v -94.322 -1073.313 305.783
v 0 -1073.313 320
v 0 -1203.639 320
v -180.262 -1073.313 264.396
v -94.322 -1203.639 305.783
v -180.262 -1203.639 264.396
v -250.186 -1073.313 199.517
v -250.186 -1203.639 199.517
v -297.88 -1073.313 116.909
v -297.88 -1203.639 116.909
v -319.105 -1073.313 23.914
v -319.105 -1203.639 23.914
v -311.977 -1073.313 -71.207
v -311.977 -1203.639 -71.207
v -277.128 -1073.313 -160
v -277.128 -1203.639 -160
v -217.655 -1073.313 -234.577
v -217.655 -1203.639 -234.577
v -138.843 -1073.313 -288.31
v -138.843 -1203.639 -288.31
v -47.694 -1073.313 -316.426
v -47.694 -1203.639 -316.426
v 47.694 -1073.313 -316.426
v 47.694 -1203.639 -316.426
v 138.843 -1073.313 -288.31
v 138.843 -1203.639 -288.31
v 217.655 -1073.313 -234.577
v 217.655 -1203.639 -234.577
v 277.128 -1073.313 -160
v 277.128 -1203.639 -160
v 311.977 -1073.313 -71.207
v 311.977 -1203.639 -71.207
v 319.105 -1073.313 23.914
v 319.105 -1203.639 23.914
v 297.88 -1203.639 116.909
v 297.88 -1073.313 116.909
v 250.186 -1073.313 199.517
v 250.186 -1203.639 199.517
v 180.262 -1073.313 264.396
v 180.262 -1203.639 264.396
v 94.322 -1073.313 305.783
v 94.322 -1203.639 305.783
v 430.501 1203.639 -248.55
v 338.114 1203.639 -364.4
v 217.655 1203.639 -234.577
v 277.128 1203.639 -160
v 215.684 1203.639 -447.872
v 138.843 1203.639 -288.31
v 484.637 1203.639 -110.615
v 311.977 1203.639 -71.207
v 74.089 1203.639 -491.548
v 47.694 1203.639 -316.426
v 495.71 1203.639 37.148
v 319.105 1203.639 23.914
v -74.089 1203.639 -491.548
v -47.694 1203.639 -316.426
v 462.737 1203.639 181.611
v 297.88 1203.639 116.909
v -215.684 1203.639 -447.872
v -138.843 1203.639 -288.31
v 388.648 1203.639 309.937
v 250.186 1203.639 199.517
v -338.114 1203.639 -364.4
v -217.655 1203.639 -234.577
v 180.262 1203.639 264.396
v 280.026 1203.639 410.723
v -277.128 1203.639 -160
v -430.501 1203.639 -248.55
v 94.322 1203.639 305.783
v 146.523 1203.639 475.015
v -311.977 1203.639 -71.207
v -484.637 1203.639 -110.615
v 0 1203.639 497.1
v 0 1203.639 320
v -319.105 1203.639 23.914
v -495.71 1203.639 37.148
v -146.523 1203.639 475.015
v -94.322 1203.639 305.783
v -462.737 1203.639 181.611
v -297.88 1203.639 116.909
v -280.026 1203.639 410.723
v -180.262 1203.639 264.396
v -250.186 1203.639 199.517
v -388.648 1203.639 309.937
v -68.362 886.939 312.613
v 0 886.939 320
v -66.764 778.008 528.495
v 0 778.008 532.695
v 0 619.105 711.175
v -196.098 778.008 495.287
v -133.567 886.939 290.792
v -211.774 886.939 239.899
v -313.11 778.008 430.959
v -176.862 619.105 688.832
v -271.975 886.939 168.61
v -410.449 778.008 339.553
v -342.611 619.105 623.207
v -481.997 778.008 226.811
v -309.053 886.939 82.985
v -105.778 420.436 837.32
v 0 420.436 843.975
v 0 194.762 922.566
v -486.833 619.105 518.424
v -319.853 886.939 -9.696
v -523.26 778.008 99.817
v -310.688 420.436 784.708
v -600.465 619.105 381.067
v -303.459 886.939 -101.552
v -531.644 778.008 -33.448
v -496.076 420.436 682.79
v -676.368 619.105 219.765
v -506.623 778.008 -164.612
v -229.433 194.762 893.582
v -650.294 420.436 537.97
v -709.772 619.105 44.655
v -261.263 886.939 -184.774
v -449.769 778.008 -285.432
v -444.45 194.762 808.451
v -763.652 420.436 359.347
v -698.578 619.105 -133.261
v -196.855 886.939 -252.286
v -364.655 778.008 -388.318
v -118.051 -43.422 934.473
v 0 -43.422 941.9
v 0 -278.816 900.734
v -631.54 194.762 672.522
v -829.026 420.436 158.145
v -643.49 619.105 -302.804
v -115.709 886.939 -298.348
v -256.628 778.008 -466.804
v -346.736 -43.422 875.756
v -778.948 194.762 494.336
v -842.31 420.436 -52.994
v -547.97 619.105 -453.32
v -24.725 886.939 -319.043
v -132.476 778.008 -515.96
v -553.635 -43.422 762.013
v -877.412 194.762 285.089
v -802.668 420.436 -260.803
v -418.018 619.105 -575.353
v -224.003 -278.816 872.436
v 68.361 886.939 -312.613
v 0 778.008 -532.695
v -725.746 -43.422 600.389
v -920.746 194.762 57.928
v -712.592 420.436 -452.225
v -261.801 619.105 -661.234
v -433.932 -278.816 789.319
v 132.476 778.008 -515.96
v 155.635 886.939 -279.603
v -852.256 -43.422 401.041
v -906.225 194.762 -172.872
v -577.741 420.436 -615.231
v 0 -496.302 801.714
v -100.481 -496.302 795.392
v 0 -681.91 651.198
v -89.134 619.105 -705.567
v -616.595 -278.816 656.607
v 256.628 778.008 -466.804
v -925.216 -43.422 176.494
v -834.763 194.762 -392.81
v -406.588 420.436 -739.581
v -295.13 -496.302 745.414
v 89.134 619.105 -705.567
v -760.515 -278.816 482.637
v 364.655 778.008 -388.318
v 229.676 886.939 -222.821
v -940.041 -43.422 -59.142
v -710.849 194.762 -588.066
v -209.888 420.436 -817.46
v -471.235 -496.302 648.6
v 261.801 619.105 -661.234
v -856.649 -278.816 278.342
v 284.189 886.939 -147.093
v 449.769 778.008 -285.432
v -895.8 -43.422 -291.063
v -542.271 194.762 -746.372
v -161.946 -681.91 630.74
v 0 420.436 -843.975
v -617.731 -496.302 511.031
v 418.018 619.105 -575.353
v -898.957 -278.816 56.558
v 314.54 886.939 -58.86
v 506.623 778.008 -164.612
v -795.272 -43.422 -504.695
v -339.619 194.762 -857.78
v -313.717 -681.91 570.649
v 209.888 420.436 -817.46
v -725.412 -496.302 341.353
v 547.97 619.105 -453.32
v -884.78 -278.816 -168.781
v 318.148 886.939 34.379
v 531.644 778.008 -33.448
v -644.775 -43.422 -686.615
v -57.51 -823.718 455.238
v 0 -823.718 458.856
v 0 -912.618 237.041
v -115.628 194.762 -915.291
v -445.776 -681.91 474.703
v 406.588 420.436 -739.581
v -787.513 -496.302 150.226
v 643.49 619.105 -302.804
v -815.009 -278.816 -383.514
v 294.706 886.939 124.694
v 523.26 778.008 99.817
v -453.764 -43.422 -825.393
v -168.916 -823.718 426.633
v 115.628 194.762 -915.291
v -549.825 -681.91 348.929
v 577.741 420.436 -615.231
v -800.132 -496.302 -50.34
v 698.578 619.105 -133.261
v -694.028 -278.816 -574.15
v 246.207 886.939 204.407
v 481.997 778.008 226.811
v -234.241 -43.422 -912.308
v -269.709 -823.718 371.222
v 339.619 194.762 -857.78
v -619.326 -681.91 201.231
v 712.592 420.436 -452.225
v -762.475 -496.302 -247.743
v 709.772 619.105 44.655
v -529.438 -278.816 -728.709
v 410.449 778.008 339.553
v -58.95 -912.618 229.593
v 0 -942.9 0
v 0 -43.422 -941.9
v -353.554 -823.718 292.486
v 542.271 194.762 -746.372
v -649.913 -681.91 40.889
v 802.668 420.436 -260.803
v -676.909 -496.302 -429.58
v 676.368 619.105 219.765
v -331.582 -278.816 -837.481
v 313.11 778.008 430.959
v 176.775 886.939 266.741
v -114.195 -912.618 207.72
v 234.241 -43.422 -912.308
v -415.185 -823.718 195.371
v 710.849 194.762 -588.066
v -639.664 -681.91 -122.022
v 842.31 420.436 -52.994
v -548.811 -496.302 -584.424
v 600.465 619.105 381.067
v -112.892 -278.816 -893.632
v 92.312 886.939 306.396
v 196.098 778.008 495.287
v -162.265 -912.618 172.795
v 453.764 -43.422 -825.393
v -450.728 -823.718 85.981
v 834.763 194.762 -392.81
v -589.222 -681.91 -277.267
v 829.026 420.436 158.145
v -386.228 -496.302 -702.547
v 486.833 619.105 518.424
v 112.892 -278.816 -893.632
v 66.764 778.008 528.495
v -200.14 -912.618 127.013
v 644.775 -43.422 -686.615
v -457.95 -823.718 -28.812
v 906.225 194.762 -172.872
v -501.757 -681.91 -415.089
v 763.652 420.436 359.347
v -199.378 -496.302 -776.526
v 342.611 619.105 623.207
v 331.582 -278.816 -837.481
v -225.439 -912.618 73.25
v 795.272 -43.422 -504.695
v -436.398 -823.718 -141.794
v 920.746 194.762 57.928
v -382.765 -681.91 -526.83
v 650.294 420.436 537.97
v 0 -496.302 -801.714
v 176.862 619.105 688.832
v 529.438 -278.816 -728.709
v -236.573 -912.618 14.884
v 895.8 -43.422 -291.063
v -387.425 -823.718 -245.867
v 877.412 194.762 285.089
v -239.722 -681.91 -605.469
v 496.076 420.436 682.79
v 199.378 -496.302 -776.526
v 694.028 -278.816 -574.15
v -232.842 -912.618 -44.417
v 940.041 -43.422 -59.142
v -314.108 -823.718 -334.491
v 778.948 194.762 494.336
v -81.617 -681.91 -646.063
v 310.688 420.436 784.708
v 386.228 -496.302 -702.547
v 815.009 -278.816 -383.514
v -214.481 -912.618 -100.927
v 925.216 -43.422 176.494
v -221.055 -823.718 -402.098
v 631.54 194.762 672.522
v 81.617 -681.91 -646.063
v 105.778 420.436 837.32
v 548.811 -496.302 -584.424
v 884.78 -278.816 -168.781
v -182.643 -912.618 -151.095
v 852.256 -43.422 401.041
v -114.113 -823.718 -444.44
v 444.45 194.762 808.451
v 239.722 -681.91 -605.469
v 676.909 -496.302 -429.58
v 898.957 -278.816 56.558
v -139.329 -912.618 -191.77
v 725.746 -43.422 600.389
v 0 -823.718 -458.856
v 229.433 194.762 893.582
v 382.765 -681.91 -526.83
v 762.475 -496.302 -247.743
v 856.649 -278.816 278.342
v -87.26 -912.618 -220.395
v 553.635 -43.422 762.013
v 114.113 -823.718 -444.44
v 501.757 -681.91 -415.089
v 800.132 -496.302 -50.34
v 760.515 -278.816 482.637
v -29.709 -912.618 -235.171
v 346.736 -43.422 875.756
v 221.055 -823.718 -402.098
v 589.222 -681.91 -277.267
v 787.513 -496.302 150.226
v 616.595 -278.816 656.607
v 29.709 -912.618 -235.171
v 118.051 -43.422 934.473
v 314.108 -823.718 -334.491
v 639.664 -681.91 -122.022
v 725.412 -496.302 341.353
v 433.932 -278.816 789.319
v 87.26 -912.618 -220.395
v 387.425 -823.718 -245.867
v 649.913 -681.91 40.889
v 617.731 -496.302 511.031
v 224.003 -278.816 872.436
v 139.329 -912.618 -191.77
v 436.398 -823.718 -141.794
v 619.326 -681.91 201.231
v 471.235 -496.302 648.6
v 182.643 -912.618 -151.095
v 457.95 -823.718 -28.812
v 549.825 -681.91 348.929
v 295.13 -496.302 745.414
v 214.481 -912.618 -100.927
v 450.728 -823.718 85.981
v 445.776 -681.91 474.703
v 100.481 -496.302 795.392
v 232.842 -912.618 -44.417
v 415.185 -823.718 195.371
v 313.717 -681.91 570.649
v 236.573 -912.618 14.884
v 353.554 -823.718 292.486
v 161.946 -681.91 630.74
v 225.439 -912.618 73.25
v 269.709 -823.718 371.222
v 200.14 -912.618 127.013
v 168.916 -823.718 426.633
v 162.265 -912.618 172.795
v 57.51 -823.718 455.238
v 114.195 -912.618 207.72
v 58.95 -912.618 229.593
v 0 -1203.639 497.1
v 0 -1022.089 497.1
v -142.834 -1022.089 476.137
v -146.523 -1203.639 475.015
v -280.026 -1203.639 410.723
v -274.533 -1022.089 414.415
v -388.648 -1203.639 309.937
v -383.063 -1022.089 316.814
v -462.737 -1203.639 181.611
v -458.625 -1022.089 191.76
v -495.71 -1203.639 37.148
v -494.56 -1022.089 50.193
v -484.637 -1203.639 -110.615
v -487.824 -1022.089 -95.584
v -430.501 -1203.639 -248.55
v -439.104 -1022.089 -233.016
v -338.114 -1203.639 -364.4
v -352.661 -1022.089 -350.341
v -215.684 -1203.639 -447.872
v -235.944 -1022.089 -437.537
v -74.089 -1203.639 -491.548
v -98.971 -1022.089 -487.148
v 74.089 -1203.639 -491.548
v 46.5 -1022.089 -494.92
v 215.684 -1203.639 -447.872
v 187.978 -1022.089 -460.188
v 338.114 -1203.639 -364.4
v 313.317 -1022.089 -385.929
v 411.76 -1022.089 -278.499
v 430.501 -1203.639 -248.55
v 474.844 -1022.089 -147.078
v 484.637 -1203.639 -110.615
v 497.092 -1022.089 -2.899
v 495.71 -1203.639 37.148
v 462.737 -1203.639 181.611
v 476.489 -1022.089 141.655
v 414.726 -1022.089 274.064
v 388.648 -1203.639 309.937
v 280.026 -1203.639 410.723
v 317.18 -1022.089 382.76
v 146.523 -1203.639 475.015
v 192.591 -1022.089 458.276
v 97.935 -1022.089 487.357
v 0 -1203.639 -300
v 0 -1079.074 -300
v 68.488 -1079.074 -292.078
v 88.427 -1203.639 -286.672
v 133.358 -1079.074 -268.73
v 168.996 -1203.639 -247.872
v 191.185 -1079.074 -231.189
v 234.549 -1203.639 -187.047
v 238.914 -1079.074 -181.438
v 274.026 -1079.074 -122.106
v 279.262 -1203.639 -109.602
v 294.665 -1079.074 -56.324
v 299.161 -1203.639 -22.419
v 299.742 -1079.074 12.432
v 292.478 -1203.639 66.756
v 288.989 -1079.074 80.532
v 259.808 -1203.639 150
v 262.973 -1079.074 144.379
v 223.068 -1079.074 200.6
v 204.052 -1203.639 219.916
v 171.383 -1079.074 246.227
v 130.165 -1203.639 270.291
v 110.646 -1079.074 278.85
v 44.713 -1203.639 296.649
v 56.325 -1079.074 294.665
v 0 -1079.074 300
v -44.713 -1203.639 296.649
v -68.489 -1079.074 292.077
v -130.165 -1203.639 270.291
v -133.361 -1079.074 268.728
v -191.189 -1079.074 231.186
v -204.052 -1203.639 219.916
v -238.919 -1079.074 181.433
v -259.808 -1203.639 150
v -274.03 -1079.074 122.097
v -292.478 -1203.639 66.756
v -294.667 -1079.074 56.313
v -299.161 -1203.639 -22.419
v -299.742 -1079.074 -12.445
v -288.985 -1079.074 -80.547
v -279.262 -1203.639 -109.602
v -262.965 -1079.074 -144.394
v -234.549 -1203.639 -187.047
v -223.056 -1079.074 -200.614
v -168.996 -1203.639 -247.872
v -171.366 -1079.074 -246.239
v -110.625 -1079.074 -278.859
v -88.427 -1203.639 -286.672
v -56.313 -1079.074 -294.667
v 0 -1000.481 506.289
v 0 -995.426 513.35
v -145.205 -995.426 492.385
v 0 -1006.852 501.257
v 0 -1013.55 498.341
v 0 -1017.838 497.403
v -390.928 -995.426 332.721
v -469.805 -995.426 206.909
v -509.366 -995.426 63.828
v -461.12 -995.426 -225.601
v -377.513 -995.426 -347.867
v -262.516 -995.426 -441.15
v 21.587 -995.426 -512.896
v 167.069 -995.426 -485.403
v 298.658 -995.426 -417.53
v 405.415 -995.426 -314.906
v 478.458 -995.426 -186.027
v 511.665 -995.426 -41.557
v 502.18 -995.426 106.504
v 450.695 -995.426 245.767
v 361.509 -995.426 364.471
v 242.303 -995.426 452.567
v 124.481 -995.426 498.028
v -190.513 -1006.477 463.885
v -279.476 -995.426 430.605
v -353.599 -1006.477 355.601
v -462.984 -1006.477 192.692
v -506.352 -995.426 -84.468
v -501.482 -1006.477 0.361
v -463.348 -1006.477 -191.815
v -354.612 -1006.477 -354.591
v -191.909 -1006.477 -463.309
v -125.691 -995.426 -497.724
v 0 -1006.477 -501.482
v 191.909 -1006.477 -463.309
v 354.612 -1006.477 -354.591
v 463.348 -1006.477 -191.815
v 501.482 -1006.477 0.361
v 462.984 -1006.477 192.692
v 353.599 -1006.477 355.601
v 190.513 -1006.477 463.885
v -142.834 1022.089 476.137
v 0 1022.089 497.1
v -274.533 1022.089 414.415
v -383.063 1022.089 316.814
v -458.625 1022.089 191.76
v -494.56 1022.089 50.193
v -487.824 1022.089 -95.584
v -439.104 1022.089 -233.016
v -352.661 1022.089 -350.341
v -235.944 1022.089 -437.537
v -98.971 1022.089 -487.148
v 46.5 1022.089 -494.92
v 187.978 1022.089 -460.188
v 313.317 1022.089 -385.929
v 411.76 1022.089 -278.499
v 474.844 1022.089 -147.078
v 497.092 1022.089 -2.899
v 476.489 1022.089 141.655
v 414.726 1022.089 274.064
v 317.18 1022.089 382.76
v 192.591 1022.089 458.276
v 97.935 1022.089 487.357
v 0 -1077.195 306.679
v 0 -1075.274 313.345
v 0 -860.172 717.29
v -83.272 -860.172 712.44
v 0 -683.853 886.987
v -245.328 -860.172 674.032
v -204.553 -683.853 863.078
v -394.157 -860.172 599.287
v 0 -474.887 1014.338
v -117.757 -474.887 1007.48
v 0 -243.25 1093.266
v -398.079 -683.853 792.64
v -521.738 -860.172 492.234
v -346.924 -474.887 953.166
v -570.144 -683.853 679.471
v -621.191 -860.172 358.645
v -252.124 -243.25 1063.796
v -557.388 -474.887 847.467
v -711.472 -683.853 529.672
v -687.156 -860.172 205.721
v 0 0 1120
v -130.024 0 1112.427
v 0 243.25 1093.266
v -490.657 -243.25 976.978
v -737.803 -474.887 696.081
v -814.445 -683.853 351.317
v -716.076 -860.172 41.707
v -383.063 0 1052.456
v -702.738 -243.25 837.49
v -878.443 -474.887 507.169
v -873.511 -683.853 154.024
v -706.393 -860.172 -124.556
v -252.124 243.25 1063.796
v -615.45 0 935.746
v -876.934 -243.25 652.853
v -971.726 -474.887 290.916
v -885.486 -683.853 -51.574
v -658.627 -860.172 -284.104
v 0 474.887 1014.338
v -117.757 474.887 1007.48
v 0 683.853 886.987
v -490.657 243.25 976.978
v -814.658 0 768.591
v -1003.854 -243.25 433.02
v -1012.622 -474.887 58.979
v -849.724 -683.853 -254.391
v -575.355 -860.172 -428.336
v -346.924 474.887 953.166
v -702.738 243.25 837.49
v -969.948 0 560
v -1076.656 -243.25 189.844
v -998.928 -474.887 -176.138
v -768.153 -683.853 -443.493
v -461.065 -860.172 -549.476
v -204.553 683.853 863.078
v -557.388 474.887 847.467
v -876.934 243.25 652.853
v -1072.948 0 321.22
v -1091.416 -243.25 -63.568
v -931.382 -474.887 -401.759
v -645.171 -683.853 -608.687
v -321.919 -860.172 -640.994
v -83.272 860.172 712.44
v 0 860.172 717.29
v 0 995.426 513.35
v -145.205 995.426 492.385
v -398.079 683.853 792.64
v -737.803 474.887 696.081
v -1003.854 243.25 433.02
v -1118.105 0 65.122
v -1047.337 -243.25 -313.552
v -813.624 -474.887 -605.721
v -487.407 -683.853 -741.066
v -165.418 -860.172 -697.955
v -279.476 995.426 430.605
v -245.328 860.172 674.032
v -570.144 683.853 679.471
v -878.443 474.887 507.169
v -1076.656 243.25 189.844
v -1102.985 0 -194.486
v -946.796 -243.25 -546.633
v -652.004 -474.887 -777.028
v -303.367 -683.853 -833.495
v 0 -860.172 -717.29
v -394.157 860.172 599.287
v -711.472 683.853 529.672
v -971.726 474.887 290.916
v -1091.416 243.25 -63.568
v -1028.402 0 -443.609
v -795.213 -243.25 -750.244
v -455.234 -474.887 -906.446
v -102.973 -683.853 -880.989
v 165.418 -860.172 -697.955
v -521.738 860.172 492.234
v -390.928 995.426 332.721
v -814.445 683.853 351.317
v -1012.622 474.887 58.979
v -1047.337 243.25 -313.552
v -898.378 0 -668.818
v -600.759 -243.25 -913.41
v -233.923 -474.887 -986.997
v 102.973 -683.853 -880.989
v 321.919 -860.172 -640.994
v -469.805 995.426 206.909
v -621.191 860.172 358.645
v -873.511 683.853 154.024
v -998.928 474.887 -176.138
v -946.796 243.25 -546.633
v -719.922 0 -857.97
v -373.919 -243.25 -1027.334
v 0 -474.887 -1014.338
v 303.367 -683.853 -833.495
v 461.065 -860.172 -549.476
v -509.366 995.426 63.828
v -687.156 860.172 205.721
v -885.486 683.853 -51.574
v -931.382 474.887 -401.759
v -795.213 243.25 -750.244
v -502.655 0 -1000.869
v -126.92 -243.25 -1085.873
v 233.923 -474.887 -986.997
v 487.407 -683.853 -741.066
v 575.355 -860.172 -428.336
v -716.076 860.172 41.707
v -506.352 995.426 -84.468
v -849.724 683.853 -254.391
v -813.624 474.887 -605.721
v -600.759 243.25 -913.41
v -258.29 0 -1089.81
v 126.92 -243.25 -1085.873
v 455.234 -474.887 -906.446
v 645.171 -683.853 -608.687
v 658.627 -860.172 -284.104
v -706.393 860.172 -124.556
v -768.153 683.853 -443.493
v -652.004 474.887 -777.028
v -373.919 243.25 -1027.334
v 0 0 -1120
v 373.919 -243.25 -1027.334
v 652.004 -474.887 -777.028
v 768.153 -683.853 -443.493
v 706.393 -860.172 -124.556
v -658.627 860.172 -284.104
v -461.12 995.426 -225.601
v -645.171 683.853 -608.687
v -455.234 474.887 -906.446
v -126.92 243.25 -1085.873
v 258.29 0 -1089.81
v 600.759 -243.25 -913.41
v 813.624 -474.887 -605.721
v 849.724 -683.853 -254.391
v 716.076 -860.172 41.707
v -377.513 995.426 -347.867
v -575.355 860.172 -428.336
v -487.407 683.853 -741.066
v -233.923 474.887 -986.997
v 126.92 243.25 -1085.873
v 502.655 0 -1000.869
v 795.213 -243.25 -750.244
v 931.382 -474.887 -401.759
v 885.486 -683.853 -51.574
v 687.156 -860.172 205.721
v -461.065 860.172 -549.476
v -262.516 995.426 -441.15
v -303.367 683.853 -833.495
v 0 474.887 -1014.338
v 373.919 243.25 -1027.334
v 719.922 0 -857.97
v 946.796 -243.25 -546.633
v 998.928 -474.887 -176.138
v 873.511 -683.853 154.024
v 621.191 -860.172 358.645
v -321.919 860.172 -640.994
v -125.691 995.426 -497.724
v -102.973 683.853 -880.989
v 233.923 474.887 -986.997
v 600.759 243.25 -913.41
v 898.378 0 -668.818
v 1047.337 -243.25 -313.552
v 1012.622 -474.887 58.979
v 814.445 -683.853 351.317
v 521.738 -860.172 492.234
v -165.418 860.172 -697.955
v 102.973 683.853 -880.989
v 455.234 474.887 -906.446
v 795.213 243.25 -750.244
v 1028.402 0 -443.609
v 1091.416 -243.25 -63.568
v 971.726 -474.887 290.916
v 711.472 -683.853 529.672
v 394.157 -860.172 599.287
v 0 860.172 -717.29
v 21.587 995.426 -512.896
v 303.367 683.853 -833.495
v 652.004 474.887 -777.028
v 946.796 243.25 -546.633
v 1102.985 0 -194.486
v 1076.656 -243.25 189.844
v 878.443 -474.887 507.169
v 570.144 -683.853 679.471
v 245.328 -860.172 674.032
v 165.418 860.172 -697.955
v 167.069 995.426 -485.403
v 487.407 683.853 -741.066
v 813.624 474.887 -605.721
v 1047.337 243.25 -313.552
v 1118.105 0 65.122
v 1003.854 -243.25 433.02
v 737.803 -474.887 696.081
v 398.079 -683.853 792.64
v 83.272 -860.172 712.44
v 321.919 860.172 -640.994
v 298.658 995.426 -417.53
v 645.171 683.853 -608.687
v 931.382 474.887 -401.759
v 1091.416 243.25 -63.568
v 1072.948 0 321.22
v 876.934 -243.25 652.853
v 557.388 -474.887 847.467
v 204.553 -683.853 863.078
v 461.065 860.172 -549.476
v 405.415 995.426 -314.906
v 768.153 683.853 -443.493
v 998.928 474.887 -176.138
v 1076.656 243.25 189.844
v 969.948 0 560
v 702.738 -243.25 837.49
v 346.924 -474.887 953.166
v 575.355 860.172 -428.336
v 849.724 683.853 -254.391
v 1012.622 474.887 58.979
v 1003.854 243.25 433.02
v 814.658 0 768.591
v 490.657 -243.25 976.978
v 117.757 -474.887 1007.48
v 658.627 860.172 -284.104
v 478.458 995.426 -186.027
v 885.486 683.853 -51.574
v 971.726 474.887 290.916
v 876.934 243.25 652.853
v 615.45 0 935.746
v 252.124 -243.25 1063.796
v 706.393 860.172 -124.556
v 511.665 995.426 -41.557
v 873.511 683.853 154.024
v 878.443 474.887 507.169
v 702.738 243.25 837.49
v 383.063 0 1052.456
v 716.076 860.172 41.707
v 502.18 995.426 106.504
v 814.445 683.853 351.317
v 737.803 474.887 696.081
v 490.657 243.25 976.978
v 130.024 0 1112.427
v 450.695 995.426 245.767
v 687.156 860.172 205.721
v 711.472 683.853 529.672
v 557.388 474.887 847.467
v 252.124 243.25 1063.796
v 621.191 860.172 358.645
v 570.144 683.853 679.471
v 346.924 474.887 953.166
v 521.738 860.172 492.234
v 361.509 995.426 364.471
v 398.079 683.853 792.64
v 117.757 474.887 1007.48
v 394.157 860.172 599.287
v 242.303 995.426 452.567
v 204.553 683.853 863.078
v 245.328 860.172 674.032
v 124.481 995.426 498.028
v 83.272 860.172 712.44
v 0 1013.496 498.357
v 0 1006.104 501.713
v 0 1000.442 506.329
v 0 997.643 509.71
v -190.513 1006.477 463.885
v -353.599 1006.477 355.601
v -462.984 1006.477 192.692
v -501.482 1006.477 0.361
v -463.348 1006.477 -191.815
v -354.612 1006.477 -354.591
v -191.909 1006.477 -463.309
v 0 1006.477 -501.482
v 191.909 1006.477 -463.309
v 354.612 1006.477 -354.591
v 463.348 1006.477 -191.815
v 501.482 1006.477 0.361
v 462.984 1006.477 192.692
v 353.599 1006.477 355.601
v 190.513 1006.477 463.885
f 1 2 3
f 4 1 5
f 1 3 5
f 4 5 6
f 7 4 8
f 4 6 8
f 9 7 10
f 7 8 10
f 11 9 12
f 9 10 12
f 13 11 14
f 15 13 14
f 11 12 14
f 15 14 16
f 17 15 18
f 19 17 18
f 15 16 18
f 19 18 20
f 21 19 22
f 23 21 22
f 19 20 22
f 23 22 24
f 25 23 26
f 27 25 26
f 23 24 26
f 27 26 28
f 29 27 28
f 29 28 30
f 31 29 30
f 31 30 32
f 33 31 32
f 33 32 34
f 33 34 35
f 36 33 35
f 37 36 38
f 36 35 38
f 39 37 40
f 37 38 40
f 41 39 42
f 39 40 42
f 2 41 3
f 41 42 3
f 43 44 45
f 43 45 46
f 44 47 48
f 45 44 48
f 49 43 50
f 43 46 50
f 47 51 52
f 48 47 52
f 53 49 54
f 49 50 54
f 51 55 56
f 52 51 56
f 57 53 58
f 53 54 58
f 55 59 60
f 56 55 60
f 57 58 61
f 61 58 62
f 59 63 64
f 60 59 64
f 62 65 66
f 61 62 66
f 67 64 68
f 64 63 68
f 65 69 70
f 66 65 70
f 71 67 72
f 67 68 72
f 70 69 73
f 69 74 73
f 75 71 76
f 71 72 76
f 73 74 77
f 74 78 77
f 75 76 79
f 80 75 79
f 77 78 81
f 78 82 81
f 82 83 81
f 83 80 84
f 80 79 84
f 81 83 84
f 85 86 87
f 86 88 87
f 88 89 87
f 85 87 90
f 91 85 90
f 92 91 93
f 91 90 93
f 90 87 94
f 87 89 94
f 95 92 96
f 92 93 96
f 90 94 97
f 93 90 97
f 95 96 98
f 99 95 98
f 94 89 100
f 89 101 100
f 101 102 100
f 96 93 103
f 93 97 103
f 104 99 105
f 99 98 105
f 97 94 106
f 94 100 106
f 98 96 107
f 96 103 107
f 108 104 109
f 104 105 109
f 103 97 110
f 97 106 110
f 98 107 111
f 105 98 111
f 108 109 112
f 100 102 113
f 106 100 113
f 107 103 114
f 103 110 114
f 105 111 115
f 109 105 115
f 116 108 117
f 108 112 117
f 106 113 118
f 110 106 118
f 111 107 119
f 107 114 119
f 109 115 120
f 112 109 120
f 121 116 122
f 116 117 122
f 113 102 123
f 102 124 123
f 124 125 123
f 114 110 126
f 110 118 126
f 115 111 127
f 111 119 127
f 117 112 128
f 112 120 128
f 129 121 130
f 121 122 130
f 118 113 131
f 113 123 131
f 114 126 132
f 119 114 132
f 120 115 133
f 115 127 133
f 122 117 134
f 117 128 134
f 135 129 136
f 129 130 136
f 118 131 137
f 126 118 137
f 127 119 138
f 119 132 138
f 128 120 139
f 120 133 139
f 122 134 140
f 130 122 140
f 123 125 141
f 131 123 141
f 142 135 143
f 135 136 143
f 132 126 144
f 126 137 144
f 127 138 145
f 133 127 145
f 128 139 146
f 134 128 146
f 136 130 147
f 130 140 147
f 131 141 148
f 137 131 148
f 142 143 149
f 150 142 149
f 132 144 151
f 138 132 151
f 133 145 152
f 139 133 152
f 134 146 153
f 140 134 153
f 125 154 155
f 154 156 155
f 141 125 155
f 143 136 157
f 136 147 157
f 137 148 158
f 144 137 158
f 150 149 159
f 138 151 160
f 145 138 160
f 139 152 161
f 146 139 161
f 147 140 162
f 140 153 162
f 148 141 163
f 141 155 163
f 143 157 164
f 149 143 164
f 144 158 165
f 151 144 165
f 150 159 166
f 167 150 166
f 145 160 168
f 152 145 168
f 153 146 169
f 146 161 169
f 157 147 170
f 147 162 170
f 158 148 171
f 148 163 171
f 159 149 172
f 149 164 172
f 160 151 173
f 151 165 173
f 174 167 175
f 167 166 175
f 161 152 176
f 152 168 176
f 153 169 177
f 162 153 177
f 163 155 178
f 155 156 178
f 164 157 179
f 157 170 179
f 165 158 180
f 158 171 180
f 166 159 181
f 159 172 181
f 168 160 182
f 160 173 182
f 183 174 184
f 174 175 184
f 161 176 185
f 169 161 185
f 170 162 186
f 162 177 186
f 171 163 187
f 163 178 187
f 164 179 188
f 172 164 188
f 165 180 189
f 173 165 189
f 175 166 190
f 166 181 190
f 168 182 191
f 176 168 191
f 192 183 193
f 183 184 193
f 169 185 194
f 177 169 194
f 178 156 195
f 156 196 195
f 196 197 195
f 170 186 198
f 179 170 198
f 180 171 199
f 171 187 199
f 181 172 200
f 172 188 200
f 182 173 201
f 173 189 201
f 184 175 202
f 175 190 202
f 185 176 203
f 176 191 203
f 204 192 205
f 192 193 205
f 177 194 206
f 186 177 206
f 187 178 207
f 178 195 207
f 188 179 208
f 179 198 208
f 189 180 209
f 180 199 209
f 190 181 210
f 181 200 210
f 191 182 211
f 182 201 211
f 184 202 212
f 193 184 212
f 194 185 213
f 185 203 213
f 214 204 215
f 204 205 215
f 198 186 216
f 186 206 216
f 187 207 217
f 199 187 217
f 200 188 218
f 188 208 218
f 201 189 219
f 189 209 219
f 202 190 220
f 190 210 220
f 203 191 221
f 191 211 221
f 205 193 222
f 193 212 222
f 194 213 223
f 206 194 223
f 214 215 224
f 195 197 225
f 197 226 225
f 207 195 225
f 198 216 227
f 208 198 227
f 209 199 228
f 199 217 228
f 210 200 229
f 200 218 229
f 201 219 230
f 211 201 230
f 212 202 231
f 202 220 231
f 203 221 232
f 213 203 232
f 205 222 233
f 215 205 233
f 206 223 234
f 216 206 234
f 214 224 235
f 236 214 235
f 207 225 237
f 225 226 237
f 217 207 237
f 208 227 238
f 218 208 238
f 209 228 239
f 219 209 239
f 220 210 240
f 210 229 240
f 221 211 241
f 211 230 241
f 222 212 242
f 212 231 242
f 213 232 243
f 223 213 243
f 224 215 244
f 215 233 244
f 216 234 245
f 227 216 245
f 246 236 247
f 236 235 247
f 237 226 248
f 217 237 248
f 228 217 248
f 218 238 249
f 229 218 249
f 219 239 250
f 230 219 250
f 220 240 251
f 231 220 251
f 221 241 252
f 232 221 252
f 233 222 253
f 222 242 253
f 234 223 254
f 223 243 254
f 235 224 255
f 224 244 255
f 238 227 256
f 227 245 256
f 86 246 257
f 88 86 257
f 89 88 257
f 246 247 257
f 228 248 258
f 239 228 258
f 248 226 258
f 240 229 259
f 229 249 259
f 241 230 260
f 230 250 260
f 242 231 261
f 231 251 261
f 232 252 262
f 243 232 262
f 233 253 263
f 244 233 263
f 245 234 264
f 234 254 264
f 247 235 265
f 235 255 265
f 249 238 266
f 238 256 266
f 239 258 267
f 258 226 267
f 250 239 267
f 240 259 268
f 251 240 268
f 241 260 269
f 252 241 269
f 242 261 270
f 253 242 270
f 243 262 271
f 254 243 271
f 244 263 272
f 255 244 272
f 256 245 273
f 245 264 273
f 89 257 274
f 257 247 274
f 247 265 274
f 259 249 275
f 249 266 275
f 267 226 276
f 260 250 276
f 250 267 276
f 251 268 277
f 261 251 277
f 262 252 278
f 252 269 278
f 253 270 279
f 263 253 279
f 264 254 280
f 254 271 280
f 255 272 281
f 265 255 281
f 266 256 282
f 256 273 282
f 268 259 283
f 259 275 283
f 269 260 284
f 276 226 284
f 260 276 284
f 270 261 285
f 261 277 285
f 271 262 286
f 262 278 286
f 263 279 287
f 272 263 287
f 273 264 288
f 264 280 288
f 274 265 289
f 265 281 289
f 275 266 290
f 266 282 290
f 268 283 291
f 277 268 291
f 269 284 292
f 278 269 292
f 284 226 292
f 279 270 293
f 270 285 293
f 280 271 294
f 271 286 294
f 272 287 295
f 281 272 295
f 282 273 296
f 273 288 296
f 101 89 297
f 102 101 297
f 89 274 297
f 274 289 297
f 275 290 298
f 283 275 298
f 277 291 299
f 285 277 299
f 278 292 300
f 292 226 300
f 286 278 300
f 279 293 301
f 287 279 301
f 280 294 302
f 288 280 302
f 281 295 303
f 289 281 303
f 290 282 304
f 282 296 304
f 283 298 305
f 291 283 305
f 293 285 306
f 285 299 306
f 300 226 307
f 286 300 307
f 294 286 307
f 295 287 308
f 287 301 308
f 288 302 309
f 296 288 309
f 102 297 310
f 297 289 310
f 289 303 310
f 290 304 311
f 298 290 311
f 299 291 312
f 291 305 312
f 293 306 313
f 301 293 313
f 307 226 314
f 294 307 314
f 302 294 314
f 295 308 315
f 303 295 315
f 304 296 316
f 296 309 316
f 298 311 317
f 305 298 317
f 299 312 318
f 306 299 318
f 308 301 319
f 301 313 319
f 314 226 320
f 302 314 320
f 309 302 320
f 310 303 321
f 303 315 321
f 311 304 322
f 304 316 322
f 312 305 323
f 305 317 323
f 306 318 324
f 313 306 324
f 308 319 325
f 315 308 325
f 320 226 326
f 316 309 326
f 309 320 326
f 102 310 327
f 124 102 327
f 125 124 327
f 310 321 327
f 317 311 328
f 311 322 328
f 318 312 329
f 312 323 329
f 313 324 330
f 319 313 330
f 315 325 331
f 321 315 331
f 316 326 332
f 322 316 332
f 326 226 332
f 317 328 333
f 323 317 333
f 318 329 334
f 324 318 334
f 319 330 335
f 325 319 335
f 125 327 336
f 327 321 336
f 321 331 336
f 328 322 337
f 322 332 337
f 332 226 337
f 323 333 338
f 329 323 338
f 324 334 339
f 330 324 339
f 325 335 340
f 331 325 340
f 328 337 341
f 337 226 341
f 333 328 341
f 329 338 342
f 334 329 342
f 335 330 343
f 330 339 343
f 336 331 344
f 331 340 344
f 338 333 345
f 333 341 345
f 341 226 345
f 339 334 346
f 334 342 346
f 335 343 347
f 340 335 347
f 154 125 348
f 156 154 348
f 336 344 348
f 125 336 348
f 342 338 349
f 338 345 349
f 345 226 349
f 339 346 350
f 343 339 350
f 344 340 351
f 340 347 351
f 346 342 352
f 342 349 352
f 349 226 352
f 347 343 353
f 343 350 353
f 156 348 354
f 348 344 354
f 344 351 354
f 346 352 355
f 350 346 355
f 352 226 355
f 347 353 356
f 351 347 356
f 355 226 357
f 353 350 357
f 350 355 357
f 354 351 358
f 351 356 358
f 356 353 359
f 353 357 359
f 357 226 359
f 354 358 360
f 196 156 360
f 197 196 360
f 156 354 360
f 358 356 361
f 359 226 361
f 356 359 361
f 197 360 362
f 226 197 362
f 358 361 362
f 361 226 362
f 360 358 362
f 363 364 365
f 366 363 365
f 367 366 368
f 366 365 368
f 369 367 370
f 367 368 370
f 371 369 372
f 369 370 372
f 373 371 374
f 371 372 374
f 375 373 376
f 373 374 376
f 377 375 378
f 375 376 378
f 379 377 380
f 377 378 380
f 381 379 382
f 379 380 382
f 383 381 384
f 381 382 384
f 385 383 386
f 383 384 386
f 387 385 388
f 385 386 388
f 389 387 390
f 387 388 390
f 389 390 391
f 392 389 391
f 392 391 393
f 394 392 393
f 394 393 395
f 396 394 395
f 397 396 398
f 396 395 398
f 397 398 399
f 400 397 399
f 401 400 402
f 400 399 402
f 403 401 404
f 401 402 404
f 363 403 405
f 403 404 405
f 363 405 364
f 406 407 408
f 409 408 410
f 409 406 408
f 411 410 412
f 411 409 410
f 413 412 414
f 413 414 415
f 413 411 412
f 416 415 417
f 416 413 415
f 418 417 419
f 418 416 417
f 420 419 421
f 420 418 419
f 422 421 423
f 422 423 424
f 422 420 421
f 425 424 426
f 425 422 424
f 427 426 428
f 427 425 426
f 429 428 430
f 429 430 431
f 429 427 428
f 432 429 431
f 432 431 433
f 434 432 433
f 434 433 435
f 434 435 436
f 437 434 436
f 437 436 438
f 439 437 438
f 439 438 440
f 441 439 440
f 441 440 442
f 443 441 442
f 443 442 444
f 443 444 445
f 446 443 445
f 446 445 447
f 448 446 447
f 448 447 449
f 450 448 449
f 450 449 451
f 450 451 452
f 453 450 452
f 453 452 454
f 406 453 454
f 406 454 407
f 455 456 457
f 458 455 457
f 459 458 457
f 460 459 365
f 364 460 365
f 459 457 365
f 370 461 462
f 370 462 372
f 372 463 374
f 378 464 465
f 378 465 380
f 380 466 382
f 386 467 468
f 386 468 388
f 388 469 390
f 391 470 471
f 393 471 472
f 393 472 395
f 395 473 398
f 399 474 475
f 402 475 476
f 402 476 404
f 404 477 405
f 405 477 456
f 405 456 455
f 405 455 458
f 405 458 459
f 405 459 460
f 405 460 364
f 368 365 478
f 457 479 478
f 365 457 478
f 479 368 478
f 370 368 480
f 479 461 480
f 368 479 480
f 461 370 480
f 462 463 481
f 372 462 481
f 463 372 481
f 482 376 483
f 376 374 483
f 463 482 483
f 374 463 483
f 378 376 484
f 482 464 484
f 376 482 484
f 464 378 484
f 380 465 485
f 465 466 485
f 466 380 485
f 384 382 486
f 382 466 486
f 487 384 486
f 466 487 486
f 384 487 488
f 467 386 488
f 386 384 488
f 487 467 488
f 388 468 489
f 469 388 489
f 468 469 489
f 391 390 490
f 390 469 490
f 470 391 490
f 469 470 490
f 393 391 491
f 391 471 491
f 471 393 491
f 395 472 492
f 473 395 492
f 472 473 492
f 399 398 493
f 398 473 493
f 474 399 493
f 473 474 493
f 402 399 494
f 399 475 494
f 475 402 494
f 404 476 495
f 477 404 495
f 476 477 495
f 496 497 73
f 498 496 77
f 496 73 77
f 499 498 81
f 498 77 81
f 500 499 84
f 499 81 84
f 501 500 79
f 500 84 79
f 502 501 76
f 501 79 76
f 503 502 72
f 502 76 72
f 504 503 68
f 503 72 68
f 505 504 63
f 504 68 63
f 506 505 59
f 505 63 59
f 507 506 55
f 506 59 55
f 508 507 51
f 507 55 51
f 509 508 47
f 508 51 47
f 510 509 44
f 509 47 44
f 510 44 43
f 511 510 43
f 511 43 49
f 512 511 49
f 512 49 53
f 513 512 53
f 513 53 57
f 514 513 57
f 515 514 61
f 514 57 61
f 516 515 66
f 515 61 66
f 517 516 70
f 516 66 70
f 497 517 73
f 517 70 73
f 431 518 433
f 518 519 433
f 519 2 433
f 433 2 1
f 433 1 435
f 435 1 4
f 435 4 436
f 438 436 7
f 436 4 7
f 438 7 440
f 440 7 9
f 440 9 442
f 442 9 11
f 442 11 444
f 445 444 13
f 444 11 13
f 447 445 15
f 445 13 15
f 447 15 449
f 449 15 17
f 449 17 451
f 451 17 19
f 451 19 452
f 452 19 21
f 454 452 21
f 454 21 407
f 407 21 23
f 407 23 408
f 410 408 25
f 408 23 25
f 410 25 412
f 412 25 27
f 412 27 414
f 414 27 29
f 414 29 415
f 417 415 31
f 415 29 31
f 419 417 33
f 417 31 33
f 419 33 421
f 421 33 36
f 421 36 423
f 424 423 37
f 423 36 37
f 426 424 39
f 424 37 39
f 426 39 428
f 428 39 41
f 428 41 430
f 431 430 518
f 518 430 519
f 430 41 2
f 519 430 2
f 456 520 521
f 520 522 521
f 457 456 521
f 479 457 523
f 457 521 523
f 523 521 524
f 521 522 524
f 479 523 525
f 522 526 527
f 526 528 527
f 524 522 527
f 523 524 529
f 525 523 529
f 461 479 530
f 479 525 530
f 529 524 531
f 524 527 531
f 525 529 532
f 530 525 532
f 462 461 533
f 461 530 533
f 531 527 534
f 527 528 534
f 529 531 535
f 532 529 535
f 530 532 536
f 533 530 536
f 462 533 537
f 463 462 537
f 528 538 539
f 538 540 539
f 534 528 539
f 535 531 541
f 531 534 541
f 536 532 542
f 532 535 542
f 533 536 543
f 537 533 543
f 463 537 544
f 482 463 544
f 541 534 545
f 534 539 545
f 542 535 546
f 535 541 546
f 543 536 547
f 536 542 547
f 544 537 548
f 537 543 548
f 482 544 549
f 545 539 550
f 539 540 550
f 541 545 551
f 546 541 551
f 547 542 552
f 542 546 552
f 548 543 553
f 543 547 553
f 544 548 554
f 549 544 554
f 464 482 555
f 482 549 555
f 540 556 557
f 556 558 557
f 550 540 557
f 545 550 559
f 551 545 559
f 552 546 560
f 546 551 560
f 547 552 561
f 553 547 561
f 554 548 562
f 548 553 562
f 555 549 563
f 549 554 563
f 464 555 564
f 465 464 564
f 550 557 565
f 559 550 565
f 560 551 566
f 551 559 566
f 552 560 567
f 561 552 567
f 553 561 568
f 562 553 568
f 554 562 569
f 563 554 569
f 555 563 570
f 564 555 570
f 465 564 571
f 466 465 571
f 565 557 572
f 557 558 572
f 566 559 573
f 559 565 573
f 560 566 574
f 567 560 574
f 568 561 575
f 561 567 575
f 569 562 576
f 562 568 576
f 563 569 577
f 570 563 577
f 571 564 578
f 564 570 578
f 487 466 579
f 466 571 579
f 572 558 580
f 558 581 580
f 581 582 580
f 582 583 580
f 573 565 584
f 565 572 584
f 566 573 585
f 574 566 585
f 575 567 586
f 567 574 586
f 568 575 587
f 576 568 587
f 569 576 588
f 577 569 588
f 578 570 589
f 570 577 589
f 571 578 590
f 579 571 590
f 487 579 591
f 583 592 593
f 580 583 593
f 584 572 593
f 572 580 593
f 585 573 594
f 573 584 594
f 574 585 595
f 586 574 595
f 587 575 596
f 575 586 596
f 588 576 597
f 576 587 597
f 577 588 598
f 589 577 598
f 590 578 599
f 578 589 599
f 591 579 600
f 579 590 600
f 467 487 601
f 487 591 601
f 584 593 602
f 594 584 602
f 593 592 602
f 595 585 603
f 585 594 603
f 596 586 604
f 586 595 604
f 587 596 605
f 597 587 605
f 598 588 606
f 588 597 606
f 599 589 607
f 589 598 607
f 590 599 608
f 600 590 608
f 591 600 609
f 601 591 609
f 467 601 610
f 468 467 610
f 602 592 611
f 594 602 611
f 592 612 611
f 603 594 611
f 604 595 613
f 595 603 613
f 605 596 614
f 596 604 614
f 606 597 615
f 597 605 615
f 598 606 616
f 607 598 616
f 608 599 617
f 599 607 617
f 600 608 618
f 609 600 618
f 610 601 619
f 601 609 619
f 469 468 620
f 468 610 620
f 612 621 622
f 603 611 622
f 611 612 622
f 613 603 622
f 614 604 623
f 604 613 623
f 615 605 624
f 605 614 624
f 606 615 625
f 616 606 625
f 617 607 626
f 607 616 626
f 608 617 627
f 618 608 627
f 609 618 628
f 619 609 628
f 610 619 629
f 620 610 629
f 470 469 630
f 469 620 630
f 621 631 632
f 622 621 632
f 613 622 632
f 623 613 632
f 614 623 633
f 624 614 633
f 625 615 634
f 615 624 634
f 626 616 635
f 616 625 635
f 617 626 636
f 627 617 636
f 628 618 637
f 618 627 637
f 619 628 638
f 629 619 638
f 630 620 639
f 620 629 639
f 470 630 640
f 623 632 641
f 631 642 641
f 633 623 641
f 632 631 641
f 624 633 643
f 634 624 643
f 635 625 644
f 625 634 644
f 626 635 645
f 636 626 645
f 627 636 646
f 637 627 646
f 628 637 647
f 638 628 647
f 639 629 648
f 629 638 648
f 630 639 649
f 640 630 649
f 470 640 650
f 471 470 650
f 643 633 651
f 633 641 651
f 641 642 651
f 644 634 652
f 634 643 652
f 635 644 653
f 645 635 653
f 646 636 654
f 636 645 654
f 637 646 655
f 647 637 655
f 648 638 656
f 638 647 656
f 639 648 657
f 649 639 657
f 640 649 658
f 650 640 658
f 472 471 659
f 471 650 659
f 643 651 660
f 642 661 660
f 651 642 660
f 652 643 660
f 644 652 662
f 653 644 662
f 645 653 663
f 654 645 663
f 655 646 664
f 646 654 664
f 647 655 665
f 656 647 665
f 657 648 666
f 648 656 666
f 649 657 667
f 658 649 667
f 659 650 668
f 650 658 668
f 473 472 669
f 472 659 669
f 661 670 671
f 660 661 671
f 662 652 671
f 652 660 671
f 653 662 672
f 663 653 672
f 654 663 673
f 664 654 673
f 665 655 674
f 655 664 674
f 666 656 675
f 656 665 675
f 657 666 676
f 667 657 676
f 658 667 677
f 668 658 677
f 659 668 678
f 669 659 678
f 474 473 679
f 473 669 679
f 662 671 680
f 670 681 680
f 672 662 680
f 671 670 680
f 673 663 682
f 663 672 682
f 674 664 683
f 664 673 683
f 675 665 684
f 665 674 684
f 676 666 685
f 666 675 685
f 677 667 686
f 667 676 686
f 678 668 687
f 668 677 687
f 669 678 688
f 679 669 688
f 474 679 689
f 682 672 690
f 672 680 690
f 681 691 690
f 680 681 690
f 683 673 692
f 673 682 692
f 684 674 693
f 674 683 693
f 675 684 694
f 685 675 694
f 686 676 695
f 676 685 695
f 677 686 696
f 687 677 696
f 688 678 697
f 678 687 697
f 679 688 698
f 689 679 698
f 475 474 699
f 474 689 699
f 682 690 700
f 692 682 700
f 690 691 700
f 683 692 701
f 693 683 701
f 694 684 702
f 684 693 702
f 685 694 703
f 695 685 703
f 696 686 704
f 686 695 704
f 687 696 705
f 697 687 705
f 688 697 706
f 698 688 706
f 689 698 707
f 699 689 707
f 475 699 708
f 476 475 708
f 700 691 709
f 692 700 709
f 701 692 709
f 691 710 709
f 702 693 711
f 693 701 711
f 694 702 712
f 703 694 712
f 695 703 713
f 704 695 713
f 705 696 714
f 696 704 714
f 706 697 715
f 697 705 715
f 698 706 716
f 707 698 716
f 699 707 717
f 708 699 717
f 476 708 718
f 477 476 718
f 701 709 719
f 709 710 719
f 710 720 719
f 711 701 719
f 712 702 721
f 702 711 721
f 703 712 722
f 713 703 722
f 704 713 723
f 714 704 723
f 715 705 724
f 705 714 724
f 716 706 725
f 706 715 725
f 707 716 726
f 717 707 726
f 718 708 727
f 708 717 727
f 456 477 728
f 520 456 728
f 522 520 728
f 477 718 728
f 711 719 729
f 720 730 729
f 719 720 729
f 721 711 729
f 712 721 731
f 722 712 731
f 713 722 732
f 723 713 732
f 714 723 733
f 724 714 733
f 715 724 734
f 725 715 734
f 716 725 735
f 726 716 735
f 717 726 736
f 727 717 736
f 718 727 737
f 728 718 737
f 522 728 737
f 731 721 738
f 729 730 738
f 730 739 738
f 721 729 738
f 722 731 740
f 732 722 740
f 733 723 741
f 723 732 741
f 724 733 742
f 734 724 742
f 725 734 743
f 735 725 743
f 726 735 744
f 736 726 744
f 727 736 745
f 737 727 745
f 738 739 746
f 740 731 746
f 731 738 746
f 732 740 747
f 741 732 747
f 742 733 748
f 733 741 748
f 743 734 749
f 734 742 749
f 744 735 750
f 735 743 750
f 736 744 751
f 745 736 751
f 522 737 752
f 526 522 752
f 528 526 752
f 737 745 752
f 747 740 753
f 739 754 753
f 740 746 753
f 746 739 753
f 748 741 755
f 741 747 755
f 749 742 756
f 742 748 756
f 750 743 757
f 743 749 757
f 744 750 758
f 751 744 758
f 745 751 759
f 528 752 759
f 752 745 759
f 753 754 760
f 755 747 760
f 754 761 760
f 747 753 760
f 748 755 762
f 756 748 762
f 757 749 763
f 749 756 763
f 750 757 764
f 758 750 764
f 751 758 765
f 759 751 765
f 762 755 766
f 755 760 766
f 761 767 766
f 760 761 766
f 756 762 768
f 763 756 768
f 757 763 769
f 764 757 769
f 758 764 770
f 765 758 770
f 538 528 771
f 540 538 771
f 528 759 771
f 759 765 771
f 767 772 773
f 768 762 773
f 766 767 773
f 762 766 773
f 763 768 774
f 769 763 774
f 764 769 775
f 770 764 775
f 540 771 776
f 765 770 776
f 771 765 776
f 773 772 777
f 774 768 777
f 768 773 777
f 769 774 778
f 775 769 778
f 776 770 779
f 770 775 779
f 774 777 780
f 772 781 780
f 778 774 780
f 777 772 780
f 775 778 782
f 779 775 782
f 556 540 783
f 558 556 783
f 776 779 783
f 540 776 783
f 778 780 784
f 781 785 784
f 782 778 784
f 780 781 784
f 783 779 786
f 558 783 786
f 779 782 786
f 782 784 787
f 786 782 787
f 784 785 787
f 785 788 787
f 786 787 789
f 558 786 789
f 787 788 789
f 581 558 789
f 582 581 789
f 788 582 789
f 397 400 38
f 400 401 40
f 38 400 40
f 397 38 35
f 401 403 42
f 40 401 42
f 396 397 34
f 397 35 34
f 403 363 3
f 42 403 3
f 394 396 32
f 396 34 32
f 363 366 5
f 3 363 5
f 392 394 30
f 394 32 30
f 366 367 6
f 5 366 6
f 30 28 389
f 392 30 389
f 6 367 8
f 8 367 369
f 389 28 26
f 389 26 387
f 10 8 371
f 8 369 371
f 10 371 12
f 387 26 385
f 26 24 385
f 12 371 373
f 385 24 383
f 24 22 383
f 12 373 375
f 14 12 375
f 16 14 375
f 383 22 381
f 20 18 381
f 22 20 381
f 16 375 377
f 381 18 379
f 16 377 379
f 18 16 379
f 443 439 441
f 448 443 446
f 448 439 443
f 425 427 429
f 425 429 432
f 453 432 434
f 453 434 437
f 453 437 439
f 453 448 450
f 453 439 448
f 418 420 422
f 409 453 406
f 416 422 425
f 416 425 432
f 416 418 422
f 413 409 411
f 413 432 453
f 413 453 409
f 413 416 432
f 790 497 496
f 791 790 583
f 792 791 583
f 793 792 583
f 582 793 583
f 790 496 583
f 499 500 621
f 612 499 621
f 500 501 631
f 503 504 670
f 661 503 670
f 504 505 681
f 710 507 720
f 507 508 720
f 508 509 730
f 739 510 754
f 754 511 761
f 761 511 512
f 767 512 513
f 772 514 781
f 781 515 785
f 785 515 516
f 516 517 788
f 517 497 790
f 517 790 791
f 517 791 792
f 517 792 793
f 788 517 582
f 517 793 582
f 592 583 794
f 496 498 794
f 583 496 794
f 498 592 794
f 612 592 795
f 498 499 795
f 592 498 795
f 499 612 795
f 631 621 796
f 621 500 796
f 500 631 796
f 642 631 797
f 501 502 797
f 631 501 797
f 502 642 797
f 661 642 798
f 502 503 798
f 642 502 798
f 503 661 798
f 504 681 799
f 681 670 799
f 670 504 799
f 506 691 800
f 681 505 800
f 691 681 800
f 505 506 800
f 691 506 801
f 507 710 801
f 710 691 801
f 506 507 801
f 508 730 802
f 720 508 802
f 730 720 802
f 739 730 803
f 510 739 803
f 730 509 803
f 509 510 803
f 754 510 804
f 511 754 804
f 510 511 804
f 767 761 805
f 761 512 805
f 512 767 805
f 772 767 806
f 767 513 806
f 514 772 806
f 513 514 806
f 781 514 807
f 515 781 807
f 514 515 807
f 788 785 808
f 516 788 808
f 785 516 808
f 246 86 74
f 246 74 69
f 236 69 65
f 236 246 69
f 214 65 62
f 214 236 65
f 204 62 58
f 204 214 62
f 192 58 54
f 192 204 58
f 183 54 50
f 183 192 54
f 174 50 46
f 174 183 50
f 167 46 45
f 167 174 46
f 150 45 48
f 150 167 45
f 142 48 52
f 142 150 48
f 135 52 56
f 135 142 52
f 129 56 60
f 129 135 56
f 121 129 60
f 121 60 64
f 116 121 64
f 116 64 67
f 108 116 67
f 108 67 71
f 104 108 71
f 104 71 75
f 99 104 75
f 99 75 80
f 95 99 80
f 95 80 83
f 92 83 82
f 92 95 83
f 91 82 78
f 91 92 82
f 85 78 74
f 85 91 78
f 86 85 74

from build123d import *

# Parameters (mm, degrees)
CUT_EXTRUDE1_START  = -1120
SKETCH2_R           = 320
CUT_EXTRUDE1_DEPTH  = 1120
FILLET1_R           = 30
SKETCH4_R           = 300
BOSS_EXTRUDE1_DEPTH = 160


with BuildPart() as part:
    # Sketch1 → Revolve1 (revolve)
    with BuildSketch(Plane.XY, mode=Mode.PRIVATE) as revolve1_sk:
        with BuildLine():
            ThreePointArc((320, 1073.3126292), (161.693932008, 1108.266697303), (0, 1120))
            Line((0, 1120), (0, 942.9))
            ThreePointArc((0, 942.9), (942.9, 0), (0, -942.9))
            Line((0, -942.9), (0, -1120))
            ThreePointArc((0, -1120), (161.693932008, -1108.266697303), (320, -1073.3126292))
            ThreePointArc((320, -1073.3126292), (410.032559826, -1042.244357088), (497.1, -1003.639173209))
            ThreePointArc((497.1, -1003.639173209), (1120, 0), (497.1, 1003.639173209))
            ThreePointArc((497.1, 1003.639173209), (410.032559826, 1042.244357088), (320, 1073.3126292))
        make_face()
        with BuildLine():
            Line((497.1, 1203.639173209), (320, 1203.639173209))
            Line((320, 1203.639173209), (320, 1073.3126292))
            ThreePointArc((320, 1073.3126292), (410.032559826, 1042.244357088), (497.1, 1003.639173209))
            Line((497.1, 1003.639173209), (497.1, 1203.639173209))
        make_face()
        with BuildLine():
            Line((497.1, -1203.639173209), (497.1, -1003.639173209))
            ThreePointArc((497.1, -1003.639173209), (410.032559826, -1042.244357088), (320, -1073.3126292))
            Line((320, -1073.3126292), (320, -1203.639173209))
            Line((320, -1203.639173209), (497.1, -1203.639173209))
        make_face()
    revolve(revolve1_sk.sketch.rotate(Axis((0, 1478.863179405, 0), (0, -1, 0)), 90), axis=Axis((0, 1478.863179405, 0), (0, -1, 0)))

    # Sketch2 → Cut-Extrude1 (cut)
    with BuildSketch(Plane(origin=(0, 1203.639173209, 0), x_dir=(1, 0, 0), z_dir=(0, 1, 0)).offset(CUT_EXTRUDE1_START)):
        with Locations(Location((0, 0, 0), (0, 0, 270))):
            Circle(SKETCH2_R)
    extrude(amount=CUT_EXTRUDE1_DEPTH, mode=Mode.SUBTRACT)

    # Fillet1
    fillet1_edges = [part.edges().sort_by_distance(p)[0] for p in [
        (0, 1003.639173209, -497.1),
        (0, -1003.639173209, -497.1),
    ]]
    fillet(fillet1_edges, radius=FILLET1_R)

    # Sketch4 → Boss-Extrude1 (add)
    with BuildSketch(Plane.XZ.offset(1203.639173209)):
        with Locations(Location((0, 0, 0), (0, 0, 270))):
            Circle(SKETCH4_R)
    extrude(amount=-BOSS_EXTRUDE1_DEPTH)


solid = part.part
